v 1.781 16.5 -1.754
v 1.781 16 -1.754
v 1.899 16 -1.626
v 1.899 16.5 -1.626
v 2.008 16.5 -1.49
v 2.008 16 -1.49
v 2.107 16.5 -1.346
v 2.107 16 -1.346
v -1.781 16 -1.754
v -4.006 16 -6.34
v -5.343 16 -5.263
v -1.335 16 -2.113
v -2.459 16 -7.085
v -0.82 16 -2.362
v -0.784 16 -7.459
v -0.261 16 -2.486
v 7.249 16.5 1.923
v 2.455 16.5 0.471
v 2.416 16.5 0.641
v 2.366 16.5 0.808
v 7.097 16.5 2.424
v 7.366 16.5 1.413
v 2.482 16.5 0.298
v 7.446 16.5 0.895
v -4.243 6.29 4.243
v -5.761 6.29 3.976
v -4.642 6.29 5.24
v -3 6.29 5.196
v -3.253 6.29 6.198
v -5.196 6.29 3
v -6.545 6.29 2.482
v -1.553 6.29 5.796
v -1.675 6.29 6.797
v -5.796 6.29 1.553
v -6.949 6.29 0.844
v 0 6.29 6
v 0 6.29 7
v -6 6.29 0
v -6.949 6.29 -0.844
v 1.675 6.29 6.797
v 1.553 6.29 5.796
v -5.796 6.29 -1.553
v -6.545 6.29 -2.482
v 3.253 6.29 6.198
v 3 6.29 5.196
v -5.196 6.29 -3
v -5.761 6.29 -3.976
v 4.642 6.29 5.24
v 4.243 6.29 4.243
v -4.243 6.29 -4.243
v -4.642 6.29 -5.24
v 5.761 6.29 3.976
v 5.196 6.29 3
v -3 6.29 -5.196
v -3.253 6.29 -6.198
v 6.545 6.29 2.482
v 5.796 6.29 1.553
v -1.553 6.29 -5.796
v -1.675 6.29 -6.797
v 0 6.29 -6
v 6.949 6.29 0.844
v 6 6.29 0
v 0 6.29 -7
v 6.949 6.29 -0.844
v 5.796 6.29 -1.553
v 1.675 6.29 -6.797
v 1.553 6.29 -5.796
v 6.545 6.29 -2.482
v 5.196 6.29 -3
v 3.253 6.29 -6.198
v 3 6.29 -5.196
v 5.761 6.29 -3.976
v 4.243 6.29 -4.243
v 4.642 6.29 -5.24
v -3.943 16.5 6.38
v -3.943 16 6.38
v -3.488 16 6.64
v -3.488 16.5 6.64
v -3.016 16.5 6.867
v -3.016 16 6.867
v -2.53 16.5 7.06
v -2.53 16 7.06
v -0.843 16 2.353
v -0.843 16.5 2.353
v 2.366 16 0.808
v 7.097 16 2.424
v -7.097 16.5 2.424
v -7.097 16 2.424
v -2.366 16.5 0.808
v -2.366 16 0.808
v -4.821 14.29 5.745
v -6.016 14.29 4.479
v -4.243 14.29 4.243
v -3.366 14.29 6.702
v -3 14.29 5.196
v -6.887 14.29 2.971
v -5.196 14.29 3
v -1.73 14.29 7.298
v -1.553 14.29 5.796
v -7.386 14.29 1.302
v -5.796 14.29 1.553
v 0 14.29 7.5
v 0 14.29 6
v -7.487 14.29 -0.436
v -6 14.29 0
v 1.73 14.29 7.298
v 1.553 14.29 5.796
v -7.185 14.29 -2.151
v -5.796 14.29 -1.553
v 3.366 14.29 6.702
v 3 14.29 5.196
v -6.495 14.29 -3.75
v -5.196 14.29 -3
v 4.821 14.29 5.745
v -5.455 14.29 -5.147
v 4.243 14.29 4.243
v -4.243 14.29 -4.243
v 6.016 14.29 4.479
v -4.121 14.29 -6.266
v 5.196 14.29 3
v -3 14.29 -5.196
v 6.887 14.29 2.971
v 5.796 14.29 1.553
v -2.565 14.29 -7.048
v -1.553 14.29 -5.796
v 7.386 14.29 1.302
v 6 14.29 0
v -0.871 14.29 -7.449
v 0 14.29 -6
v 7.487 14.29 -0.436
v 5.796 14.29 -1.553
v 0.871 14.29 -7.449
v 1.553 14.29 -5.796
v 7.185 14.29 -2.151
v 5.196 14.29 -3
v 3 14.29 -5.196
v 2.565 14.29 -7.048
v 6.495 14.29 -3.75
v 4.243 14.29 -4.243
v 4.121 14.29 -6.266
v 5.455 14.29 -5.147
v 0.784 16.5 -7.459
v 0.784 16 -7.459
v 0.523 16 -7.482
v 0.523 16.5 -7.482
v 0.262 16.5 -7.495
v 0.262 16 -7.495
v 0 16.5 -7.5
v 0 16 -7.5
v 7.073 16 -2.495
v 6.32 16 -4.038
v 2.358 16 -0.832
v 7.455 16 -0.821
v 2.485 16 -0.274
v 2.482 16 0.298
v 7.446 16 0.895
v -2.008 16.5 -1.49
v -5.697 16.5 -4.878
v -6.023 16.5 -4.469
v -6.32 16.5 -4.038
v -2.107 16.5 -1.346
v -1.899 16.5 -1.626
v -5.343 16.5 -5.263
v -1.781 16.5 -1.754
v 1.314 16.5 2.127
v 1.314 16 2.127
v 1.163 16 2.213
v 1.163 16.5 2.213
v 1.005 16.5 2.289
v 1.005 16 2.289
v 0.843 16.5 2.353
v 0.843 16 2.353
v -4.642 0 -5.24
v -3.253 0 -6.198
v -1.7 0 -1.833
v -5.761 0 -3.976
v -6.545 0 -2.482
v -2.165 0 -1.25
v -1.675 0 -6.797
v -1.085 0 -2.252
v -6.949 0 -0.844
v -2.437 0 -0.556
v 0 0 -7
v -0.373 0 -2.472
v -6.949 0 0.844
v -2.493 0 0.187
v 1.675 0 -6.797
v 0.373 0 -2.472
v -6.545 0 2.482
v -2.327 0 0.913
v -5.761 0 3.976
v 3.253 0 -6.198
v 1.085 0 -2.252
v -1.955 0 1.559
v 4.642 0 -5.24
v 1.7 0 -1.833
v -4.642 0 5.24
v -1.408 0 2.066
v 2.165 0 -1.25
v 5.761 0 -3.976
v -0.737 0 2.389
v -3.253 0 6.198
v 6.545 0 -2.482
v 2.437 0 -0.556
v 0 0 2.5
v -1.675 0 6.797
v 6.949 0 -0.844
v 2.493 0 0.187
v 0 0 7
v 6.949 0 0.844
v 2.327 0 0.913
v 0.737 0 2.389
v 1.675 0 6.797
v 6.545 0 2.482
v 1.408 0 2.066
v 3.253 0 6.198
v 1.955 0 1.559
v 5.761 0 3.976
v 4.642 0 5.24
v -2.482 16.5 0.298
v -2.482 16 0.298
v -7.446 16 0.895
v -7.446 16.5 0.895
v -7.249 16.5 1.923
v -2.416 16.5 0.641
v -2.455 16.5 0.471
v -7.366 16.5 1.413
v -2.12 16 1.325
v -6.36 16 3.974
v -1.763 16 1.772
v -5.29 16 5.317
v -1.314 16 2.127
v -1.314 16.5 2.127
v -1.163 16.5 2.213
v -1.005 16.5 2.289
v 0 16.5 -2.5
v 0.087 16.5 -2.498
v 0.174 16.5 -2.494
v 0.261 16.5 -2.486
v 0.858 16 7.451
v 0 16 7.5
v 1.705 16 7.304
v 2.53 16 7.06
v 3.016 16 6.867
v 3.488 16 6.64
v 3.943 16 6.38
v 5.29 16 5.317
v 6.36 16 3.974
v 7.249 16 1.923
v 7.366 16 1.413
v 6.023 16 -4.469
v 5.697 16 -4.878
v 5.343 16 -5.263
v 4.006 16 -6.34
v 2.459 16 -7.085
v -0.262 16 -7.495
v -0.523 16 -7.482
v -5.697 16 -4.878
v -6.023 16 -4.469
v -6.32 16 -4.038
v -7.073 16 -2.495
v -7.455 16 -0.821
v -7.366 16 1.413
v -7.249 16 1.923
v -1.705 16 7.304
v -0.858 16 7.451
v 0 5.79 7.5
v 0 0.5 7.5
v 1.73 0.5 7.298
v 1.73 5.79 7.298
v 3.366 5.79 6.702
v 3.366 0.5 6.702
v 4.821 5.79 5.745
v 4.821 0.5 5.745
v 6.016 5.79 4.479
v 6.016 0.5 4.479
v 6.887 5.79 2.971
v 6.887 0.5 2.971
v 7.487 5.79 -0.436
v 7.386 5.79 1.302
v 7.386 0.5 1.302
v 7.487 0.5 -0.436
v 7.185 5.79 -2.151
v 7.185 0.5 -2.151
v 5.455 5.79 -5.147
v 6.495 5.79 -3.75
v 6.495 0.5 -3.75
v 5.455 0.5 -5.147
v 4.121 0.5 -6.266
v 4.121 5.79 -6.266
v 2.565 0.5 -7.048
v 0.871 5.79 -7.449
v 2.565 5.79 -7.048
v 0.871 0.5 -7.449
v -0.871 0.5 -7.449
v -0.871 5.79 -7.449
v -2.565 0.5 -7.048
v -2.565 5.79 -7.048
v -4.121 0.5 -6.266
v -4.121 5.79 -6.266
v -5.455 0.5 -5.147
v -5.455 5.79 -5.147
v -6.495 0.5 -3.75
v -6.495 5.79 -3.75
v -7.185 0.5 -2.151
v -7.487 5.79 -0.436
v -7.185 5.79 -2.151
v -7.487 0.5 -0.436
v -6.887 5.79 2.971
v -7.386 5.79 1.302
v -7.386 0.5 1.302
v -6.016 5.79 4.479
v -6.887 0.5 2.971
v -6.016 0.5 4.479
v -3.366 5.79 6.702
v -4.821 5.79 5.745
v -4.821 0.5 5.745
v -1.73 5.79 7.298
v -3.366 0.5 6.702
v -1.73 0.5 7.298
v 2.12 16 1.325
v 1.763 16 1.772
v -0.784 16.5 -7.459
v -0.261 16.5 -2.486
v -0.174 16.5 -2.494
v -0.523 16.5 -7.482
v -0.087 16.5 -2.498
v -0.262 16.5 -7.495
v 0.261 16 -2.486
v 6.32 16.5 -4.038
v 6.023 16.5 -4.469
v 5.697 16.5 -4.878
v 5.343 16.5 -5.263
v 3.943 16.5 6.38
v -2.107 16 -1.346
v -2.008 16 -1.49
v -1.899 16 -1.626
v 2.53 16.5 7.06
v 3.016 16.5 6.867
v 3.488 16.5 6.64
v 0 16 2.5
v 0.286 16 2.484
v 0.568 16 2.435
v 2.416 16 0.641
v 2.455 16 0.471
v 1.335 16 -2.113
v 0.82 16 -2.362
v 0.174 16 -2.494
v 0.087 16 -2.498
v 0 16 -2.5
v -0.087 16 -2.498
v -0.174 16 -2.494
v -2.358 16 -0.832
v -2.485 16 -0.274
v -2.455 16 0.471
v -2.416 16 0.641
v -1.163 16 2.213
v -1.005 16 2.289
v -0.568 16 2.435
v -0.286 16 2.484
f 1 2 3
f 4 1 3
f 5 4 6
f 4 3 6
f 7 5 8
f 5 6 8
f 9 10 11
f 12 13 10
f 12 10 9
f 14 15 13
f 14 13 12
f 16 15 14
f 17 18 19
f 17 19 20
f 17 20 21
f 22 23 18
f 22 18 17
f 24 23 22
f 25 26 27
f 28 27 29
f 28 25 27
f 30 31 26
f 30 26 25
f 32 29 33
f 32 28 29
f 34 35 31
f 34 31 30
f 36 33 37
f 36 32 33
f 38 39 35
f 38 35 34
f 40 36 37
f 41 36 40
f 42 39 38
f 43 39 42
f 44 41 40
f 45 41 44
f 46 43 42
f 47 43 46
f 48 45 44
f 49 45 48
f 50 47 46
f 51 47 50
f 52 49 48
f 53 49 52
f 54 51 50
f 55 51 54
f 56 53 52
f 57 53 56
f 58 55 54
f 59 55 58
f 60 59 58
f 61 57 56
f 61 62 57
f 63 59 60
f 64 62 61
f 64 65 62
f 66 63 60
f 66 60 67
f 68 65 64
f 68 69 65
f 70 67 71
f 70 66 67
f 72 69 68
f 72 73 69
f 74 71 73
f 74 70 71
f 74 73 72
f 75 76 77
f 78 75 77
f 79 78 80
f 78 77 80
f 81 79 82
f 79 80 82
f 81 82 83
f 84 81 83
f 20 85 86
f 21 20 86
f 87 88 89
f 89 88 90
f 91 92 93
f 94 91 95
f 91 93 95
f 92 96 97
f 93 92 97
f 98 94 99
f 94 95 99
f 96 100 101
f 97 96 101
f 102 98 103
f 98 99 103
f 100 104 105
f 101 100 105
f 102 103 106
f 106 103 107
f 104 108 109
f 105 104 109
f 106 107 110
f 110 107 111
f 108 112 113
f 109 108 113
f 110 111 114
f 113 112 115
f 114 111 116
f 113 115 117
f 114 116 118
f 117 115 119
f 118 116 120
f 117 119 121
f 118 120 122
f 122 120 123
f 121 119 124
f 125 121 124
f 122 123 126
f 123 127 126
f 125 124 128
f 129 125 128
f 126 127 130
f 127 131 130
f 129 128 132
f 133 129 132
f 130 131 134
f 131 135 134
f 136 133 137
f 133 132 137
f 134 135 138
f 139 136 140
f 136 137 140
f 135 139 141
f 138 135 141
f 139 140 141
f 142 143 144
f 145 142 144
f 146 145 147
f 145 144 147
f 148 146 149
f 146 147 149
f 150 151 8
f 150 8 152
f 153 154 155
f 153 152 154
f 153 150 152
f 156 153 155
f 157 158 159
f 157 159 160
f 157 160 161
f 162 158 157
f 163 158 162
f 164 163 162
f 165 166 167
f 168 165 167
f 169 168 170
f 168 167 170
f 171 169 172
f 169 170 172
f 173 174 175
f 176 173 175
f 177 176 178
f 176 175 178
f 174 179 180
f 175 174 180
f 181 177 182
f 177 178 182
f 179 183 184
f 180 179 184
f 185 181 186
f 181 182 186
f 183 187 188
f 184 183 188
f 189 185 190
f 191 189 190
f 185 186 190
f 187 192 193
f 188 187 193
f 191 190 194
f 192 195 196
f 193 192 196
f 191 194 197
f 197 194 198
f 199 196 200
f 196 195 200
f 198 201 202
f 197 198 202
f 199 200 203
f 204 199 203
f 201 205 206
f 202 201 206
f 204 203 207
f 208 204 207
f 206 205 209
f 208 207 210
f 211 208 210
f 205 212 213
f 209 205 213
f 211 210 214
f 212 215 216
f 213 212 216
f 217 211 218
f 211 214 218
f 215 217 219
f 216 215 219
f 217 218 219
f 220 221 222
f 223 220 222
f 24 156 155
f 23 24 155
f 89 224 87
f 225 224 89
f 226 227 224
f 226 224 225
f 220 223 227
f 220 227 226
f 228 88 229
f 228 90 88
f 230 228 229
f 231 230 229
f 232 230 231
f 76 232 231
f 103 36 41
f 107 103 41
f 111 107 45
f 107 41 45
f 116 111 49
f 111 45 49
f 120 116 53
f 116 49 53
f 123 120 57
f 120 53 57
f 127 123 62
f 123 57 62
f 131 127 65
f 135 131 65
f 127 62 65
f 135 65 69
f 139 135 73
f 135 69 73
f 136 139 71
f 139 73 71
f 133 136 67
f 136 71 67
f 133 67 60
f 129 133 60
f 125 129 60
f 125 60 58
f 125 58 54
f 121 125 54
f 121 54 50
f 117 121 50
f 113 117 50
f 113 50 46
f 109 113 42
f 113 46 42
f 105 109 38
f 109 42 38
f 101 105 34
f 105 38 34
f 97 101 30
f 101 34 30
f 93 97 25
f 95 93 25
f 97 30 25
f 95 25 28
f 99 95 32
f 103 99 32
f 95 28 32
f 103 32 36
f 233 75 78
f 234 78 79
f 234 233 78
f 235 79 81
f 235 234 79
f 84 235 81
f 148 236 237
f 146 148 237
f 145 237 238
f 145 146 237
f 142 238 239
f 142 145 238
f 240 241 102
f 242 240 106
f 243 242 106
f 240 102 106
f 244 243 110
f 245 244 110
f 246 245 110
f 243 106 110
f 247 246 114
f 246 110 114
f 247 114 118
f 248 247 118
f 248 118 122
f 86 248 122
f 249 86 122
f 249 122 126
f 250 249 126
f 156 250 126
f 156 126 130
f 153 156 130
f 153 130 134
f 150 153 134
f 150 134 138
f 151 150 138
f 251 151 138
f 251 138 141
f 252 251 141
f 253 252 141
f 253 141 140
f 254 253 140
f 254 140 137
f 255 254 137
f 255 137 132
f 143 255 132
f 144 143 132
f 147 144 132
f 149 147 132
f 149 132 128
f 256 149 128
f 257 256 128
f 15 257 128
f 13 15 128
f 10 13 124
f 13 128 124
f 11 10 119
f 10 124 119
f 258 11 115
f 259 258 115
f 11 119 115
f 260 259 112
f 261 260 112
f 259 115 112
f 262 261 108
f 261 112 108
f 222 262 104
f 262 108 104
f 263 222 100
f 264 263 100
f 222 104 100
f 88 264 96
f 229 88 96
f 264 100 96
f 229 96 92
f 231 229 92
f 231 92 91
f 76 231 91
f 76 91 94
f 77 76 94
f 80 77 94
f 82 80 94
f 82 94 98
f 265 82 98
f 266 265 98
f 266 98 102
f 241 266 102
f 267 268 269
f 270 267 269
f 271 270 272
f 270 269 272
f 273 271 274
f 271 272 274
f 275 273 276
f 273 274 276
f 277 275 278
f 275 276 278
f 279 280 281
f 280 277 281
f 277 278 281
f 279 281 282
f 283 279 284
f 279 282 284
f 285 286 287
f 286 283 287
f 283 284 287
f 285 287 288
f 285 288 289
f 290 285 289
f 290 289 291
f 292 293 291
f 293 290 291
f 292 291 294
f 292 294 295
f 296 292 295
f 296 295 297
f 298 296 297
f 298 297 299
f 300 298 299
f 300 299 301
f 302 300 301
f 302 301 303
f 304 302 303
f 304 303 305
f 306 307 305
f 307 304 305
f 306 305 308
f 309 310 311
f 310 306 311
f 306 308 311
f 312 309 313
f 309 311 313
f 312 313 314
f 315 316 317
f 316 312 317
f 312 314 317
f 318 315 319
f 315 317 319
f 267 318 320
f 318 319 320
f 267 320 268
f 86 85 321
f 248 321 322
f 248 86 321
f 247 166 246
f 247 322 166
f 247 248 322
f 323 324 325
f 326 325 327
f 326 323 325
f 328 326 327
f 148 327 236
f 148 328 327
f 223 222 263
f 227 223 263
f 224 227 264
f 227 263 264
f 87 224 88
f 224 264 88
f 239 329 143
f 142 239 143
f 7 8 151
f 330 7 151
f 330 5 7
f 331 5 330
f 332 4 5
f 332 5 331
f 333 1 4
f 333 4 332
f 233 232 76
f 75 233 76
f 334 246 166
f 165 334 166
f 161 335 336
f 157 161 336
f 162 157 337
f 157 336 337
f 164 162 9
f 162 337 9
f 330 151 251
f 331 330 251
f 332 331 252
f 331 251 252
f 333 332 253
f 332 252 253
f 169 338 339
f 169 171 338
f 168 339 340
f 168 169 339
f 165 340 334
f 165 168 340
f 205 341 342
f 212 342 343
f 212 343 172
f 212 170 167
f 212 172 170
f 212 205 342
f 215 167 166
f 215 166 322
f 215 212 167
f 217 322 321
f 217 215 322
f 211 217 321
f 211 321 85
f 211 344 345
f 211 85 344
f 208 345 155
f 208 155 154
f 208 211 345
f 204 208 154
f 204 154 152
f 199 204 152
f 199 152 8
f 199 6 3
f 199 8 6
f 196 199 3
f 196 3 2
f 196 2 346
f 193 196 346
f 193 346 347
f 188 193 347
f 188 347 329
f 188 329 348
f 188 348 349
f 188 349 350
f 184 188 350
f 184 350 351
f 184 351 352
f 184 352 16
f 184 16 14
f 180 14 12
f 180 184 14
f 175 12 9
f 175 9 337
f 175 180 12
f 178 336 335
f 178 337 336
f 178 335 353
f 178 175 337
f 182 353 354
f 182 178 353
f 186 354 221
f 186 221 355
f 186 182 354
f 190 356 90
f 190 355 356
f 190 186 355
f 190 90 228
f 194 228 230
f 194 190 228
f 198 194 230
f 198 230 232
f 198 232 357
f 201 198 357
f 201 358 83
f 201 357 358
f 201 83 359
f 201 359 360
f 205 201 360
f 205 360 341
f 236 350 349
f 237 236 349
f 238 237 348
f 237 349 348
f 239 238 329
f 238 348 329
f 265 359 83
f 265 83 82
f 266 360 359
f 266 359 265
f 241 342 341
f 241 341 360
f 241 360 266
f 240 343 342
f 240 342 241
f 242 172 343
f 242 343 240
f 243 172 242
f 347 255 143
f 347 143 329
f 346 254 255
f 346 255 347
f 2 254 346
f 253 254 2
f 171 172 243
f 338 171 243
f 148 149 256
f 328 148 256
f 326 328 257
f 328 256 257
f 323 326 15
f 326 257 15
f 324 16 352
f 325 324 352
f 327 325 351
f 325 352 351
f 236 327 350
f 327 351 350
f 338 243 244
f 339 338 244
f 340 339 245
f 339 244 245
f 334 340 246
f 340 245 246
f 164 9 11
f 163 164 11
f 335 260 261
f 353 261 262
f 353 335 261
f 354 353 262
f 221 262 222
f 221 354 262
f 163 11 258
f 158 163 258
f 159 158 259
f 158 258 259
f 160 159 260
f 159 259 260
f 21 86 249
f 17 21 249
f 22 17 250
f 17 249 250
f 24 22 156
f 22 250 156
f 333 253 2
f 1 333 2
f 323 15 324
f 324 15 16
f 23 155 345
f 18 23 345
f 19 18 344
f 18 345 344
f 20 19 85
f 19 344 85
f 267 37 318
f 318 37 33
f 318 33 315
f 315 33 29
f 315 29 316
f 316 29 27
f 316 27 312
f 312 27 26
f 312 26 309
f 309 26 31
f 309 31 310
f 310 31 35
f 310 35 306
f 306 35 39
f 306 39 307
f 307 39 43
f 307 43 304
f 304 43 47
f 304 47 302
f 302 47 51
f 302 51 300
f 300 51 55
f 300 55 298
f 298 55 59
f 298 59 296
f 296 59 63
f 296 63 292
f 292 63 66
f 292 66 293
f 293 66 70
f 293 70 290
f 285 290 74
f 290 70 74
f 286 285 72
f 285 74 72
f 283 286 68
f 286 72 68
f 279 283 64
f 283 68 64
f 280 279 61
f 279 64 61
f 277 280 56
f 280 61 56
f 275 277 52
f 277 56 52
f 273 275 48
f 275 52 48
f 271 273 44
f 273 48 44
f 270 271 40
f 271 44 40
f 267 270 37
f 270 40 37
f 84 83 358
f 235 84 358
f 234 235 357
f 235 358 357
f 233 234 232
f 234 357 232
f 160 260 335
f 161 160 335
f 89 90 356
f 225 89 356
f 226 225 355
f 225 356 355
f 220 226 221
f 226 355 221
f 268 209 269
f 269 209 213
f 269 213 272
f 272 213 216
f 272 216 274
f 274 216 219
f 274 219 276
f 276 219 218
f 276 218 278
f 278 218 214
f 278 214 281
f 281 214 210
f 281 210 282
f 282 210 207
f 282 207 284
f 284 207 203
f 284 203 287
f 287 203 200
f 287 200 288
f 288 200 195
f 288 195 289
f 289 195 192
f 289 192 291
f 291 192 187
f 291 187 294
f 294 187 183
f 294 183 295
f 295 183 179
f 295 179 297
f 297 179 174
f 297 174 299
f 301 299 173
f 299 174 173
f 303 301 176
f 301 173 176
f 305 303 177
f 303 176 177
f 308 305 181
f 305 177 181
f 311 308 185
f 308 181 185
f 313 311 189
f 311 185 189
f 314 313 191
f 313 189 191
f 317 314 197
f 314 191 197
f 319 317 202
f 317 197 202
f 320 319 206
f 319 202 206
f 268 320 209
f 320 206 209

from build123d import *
from build123d.topology import SkipClean

# Parameters (mm, degrees)
SKETCH2_R           = 7.5
SKETCH2_R_2         = 2.5
BOSS_EXTRUDE1_DEPTH = 16
SKETCH3_OUTSIDE_W   = 22.314
SKETCH3_OUTSIDE_H   = 22.314
SKETCH3_OUTSIDE_R   = 6
CUT_EXTRUDE1_DEPTH  = 8
CHAMFER1_SIZE       = 0.5
BOSS_EXTRUDE2_DEPTH = 0.5


with BuildPart() as part:
    # Sketch2 → Boss-Extrude1 (new body)
    with BuildSketch(Plane(origin=(0, 0, 0), x_dir=(1, 0, 0), z_dir=(0, 1, 0))):
        with Locations(Location((0, 0, 0), (0, 0, 270))):
            Circle(SKETCH2_R)
        with Locations(Location((0, 0, 0), (0, 0, 270))):
            Circle(SKETCH2_R_2, mode=Mode.SUBTRACT)
    extrude(amount=BOSS_EXTRUDE1_DEPTH)

    # Sketch3 outside → Cut-Extrude1 (cut)
    with BuildSketch(Plane(origin=(0, 6.29, 0), x_dir=(1, 0, 0), z_dir=(0, 1, 0))):
        Rectangle(SKETCH3_OUTSIDE_W, SKETCH3_OUTSIDE_H)
        with Locations(Location((0, 0, 0), (0, 0, 270))):
            Circle(SKETCH3_OUTSIDE_R, mode=Mode.SUBTRACT)
    extrude(amount=CUT_EXTRUDE1_DEPTH, mode=Mode.SUBTRACT)

    # Chamfer1
    chamfer1_edges = [part.edges().sort_by_distance(p)[0] for p in [
        (0, 6.29, -7.5),
        (0, 0, -7.5),
    ]]
    chamfer(chamfer1_edges, length=CHAMFER1_SIZE)

    # Sketch7 → Boss-Extrude2 (add)
    with SkipClean():  # the faces are left unmerged after this step: merging them gives an invalid solid
        with BuildSketch(Plane(origin=(0, 16, 0), x_dir=(1, 0, 0), z_dir=(0, 1, 0))):
            with BuildLine():
                ThreePointArc((0.783963475, 7.458914215), (0.392519672, 7.489721511), (0, 7.5))
                Line((0, 7.5), (0, 2.5))
                ThreePointArc((0, 2.5), (0.130839891, 2.496573837), (0.261321158, 2.486304738))
                Line((0.261321158, 2.486304738), (0.783963475, 7.458914215))
            make_face()
            with BuildLine():
                Line((0, 2.5), (0, 7.5))
                ThreePointArc((0, 7.5), (-0.392519672, 7.489721511), (-0.783963475, 7.458914215))
                Line((-0.783963475, 7.458914215), (-0.261321158, 2.486304738))
                ThreePointArc((-0.261321158, 2.486304738), (-0.130839891, 2.496573837), (0, 2.5))
            make_face()
            with BuildLine():
                Line((-1.780940242, 1.754494757), (-5.342820727, 5.263484272))
                ThreePointArc((-5.342820727, 5.263484272), (-5.863736119, 4.676173514), (-6.32040719, 4.037629621))
                Line((-6.32040719, 4.037629621), (-2.106802397, 1.34587654))
                ThreePointArc((-2.106802397, 1.34587654), (-1.954578706, 1.558724505), (-1.780940242, 1.754494757))
            make_face()
            with BuildLine():
                Line((-2.482117316, -0.298485561), (-7.446351948, -0.895456684))
                ThreePointArc((-7.446351948, -0.895456684), (-7.311959341, -1.668907005), (-7.097455378, -2.424072431))
                Line((-7.097455378, -2.424072431), (-2.365818459, -0.808024144))
                ThreePointArc((-2.365818459, -0.808024144), (-2.43731978, -0.556302335), (-2.482117316, -0.298485561))
            make_face()
            with BuildLine():
                Line((-1.314209425, -2.126700164), (-3.942628274, -6.380100493))
                ThreePointArc((-3.942628274, -6.380100493), (-3.254128043, -6.757266509), (-2.529974905, -7.0603985))
                Line((-2.529974905, -7.0603985), (-0.843324968, -2.353466167))
                ThreePointArc((-0.843324968, -2.353466167), (-1.084709348, -2.25242217), (-1.314209425, -2.126700164))
            make_face()
            with BuildLine():
                ThreePointArc((2.529974905, -7.0603985), (3.254128043, -6.757266509), (3.942628274, -6.380100493))
                Line((3.942628274, -6.380100493), (1.314209425, -2.126700164))
                ThreePointArc((1.314209425, -2.126700164), (1.084709348, -2.25242217), (0.843324968, -2.353466167))
                Line((0.843324968, -2.353466167), (2.529974905, -7.0603985))
            make_face()
            with BuildLine():
                ThreePointArc((7.097455378, -2.424072431), (7.311959341, -1.668907005), (7.446351948, -0.895456684))
                Line((7.446351948, -0.895456684), (2.482117316, -0.298485561))
                ThreePointArc((2.482117316, -0.298485561), (2.43731978, -0.556302335), (2.365818459, -0.808024144))
                Line((2.365818459, -0.808024144), (7.097455378, -2.424072431))
            make_face()
            with BuildLine():
                ThreePointArc((6.32040719, 4.037629621), (5.863736119, 4.676173514), (5.342820727, 5.263484272))
                Line((5.342820727, 5.263484272), (1.780940242, 1.754494757))
                ThreePointArc((1.780940242, 1.754494757), (1.954578706, 1.558724505), (2.106802397, 1.34587654))
                Line((2.106802397, 1.34587654), (6.32040719, 4.037629621))
            make_face()
        extrude(amount=BOSS_EXTRUDE2_DEPTH)


solid = part.part
